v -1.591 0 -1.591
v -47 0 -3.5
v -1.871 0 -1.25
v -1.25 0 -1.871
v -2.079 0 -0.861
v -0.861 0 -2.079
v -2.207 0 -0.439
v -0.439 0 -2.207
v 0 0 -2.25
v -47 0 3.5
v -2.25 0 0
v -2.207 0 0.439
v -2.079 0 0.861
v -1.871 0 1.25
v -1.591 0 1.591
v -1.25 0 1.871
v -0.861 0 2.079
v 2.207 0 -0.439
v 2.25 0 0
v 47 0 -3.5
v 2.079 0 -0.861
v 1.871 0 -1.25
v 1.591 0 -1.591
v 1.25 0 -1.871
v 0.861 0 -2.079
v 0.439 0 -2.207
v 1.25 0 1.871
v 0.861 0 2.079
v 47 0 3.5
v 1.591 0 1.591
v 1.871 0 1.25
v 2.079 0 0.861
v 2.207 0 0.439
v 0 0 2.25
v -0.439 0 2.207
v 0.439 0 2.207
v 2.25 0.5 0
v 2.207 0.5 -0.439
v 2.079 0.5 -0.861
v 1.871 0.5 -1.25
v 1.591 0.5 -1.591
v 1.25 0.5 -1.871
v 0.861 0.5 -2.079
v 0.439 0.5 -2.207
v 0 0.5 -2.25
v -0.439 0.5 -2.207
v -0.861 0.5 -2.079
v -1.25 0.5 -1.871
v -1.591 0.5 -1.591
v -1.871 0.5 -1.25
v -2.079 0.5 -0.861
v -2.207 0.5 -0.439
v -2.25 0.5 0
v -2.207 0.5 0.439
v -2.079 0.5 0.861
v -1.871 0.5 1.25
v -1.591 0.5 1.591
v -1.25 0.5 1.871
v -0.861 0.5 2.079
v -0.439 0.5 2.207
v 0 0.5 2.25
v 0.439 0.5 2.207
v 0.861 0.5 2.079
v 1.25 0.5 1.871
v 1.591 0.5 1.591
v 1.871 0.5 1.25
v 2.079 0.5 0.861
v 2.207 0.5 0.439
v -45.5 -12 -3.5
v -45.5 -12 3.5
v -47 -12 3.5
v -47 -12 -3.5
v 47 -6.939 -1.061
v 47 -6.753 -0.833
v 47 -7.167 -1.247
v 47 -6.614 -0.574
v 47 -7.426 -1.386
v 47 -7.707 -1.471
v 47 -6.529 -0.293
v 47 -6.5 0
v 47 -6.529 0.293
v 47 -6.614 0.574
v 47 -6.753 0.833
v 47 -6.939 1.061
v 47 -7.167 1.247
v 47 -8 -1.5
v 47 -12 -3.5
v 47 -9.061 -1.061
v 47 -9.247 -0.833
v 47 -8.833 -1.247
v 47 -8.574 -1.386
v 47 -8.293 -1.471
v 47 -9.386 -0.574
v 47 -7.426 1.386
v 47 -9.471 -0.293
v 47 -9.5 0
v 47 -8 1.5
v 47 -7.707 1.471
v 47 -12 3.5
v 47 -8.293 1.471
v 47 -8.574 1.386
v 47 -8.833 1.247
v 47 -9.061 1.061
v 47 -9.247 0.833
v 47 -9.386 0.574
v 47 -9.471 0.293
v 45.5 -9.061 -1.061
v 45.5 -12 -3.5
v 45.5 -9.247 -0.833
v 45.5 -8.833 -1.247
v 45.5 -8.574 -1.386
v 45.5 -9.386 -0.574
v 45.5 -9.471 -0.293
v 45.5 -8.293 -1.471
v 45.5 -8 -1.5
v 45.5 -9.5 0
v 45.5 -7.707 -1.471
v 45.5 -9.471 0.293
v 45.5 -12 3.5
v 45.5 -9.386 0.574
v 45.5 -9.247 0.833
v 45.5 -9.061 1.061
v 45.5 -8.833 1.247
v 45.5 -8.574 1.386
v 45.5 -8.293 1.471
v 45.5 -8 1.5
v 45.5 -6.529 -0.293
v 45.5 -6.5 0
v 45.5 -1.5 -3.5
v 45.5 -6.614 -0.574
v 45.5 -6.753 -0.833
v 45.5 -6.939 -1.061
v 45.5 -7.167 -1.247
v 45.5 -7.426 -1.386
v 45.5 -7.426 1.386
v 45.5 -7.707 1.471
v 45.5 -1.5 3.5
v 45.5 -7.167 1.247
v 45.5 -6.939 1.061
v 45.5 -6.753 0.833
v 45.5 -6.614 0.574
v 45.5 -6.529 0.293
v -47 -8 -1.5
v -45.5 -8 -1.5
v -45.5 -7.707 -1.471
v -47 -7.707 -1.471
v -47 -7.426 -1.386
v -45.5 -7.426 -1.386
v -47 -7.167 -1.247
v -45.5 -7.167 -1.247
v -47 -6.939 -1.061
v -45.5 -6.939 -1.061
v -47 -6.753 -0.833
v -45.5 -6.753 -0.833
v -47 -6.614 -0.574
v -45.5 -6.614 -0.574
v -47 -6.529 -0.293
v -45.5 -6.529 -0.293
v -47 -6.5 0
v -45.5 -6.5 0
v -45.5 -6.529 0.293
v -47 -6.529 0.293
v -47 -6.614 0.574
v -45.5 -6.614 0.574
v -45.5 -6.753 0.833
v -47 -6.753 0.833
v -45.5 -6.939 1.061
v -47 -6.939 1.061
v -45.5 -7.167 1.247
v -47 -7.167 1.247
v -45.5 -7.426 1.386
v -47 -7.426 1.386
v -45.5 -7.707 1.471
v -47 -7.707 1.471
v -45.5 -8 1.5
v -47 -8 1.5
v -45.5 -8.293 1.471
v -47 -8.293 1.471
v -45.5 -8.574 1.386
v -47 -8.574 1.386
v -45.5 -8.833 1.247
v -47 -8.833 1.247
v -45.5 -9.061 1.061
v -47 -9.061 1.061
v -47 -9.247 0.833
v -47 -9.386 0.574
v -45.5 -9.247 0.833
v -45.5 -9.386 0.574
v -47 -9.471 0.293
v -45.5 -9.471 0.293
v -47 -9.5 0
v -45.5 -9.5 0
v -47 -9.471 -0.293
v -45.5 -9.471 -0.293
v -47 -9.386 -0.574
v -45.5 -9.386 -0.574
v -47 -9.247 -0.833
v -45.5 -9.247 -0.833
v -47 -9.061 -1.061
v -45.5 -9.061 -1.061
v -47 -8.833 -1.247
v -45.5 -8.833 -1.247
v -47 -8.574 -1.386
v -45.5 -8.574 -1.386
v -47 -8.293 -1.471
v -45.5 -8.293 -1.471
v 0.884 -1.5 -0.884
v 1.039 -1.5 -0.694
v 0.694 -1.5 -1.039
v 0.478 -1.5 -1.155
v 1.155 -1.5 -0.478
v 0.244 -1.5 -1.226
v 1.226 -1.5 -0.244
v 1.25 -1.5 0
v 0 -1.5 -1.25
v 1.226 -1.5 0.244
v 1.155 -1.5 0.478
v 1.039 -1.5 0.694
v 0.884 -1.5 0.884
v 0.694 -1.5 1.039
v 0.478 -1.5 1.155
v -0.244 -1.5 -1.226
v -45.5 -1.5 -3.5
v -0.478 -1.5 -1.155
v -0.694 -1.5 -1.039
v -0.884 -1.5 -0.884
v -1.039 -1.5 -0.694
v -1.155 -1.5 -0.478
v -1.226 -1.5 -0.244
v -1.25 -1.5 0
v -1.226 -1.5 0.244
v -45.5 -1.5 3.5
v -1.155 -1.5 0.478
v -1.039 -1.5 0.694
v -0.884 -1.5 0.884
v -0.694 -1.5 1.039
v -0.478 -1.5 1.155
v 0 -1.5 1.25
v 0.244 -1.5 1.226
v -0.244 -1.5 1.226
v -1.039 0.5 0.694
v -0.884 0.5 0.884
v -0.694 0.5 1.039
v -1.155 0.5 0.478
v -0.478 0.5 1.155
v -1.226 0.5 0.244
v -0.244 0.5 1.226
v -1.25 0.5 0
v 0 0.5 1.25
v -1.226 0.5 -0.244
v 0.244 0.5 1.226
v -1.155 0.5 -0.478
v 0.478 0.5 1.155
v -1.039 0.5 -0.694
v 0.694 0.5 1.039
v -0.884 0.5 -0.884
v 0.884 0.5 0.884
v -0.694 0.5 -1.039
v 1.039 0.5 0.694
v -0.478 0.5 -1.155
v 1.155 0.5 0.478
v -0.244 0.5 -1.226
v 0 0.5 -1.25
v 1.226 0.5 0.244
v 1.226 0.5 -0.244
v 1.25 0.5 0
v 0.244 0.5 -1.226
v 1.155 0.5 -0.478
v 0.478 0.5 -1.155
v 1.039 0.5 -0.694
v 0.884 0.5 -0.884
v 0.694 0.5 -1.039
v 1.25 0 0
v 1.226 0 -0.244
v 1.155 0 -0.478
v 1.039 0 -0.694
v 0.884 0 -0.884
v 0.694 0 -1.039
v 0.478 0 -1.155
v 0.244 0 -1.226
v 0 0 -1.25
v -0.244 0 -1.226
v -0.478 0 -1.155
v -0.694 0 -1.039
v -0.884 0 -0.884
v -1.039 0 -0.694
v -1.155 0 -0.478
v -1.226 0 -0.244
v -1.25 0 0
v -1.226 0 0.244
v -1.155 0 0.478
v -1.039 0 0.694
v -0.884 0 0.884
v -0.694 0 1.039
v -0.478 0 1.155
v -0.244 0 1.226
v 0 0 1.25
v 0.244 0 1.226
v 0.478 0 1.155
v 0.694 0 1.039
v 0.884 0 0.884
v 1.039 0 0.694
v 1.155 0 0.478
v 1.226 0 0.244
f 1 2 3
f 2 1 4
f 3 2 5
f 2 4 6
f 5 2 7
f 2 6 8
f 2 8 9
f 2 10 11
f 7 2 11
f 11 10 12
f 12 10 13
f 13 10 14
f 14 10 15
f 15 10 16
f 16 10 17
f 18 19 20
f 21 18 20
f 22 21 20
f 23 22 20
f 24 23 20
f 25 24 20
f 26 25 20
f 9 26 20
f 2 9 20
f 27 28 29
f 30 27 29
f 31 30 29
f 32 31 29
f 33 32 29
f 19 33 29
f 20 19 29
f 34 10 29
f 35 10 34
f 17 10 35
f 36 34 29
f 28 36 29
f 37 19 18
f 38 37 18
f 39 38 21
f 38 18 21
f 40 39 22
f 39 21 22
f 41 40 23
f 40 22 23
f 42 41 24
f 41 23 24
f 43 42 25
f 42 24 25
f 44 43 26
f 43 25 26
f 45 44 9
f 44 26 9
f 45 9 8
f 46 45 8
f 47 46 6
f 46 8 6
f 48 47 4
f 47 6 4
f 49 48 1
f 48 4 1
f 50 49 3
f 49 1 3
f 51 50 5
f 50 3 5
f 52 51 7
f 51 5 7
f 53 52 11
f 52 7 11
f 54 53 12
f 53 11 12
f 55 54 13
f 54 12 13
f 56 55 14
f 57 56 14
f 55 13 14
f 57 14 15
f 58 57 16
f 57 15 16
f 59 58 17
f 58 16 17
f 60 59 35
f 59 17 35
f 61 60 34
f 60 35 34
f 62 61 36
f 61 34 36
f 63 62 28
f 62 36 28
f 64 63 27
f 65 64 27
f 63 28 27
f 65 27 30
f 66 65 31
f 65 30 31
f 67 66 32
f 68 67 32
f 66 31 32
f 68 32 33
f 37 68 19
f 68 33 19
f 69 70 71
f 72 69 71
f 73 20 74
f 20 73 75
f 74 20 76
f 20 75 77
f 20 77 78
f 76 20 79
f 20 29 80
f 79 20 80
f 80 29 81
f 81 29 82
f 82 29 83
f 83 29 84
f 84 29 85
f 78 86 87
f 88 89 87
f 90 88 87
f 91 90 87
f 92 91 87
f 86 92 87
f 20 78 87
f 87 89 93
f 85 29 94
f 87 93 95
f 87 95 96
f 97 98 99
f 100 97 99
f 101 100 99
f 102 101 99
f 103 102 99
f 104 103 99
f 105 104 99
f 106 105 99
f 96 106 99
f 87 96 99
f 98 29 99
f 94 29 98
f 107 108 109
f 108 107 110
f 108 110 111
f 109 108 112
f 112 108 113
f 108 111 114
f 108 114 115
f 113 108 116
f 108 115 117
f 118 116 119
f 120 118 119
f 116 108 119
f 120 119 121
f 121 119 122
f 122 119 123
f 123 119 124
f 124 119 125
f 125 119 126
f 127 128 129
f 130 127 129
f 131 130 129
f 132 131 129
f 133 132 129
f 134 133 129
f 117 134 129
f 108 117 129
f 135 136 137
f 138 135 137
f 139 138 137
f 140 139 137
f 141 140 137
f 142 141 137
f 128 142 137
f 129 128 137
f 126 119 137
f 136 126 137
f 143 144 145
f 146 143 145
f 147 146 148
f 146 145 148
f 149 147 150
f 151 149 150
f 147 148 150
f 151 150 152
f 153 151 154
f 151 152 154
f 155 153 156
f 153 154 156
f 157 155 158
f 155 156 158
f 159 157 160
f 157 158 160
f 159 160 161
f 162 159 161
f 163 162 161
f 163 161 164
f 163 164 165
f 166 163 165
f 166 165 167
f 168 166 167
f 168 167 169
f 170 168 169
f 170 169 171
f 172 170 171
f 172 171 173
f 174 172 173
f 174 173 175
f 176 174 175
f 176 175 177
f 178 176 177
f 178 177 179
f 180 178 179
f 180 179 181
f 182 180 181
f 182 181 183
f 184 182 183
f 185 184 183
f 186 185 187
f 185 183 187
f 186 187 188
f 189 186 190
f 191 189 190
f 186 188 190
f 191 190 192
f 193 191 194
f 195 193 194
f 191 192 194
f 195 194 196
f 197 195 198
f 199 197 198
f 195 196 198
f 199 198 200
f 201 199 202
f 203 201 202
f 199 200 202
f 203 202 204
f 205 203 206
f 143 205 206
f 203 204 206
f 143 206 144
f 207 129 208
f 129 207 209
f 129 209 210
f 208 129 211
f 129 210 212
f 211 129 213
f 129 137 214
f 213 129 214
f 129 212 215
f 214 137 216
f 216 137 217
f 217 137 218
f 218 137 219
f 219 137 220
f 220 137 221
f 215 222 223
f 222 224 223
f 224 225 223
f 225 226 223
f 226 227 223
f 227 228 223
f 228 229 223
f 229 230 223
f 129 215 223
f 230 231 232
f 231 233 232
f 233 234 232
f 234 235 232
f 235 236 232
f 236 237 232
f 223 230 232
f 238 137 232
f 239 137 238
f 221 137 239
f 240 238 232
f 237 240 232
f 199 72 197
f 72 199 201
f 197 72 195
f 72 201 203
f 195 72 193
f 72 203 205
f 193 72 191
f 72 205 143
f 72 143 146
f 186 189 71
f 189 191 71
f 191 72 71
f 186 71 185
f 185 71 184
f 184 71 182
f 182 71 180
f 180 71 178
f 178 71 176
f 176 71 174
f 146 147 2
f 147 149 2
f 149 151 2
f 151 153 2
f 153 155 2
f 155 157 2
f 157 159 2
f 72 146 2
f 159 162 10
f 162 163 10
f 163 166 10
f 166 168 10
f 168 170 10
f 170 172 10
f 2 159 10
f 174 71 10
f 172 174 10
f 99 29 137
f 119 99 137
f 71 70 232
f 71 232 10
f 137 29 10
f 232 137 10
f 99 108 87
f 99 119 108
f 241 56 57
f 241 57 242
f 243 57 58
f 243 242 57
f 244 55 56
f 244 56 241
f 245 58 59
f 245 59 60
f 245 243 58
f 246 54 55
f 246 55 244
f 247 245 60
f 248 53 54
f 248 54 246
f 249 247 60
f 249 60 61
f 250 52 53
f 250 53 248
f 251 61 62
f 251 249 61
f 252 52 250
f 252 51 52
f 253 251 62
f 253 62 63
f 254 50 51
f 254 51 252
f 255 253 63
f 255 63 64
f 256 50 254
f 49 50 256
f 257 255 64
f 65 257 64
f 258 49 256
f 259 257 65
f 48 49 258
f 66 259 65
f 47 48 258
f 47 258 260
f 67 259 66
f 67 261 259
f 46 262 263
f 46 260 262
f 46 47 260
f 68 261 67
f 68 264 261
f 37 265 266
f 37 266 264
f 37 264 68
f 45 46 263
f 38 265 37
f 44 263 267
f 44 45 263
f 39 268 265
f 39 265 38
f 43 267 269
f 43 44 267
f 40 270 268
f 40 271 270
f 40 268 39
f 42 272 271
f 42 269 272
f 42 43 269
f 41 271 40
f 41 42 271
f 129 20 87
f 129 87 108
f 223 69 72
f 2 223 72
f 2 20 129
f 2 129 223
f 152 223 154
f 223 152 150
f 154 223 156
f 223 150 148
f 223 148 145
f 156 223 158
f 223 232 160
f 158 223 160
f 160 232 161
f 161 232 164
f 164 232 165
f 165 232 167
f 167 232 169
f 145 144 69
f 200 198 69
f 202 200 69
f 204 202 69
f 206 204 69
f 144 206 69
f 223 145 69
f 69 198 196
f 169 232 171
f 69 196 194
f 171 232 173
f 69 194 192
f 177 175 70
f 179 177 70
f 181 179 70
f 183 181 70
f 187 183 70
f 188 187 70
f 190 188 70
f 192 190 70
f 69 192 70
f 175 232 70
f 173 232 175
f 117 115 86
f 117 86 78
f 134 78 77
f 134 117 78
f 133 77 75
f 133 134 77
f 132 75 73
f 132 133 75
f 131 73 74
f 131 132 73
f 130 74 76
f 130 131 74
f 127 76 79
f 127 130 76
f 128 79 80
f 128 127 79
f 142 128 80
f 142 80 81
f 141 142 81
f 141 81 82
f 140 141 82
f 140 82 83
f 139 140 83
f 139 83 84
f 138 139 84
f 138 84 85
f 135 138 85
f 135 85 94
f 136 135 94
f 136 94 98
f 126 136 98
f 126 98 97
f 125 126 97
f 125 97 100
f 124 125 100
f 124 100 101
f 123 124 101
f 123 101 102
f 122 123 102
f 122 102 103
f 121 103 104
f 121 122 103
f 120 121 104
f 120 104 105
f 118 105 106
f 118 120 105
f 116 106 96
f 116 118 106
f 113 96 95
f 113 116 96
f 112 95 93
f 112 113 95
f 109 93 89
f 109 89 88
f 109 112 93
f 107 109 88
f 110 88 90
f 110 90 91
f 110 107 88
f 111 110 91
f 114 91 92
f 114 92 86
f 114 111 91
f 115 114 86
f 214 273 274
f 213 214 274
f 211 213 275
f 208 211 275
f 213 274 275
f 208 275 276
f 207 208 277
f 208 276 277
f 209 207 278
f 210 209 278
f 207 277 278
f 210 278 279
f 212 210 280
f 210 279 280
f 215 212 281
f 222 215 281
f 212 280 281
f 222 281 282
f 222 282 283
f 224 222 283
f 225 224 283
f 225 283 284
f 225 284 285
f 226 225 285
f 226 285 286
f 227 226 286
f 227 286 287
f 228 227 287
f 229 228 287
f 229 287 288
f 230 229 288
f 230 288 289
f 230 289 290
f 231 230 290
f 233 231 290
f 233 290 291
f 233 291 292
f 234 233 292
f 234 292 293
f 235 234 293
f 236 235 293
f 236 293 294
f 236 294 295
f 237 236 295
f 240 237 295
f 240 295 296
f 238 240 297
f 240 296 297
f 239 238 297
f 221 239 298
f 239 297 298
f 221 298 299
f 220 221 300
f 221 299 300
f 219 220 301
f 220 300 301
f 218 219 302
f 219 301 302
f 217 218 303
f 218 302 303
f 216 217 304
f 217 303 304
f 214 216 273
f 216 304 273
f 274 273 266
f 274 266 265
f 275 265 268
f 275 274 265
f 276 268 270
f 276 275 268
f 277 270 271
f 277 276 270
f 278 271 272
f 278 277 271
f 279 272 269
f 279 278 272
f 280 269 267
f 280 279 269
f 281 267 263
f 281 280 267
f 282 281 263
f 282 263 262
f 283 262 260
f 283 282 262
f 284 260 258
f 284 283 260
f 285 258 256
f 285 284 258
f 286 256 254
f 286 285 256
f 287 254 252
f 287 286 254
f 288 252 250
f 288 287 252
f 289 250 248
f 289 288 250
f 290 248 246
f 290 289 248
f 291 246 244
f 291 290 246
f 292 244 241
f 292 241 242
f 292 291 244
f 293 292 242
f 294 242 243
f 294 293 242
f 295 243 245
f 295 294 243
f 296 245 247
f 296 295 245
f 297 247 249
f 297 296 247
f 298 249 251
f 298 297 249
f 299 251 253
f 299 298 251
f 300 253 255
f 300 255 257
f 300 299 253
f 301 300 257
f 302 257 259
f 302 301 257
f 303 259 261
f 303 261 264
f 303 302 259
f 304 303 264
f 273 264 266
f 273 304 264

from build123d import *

# Parameters (mm, degrees)
BOSS_EXTRUDE3_DEPTH      = 3.5
BOSS_EXTRUDE3_DEPTH_BACK = 3.5
SKETCH4_R                = 1.25
CUT_EXTRUDE1_DEPTH       = 3.5
SKETCH5_R                = 2.25
SKETCH5_R_2              = 1.25
BOSS_EXTRUDE5_DEPTH      = 0.5
SKETCH8_R                = 1.5
CUT_EXTRUDE3_DEPTH       = 47
SKETCH10_R               = 1.5
CUT_EXTRUDE4_DEPTH       = 47


with BuildPart() as part:
    # Sketch1 → Boss-Extrude3 (new body, two sides)
    with BuildSketch(Plane.XY) as boss_extrude3_sk:
        Polygon((-47, 0), (47, 0), (47, -12), (46.584070796, -12), (45.5, -12), (45.5, -1.5), (-45.5, -1.5), (-45.5, -12), (-47, -12), align=None)
    extrude(amount=BOSS_EXTRUDE3_DEPTH)
    extrude(boss_extrude3_sk.sketch, amount=-BOSS_EXTRUDE3_DEPTH_BACK)

    # Sketch4 → Cut-Extrude1 (cut)
    with BuildSketch(Plane(origin=(0, 0, 0), x_dir=(1, 0, 0), z_dir=(0, 1, 0))):
        Circle(SKETCH4_R)
    extrude(amount=-CUT_EXTRUDE1_DEPTH, mode=Mode.SUBTRACT)

    # Sketch5 → Boss-Extrude5 (add)
    with BuildSketch(Plane(origin=(0, 0, 0), x_dir=(1, 0, 0), z_dir=(0, 1, 0))):
        Circle(SKETCH5_R)
        Circle(SKETCH5_R_2, mode=Mode.SUBTRACT)
    extrude(amount=BOSS_EXTRUDE5_DEPTH)

    # Sketch8 → Cut-Extrude3 (cut)
    with BuildSketch(Plane(origin=(0, 0, 0), x_dir=(0, 0, -1), z_dir=(1, 0, 0))):
        with Locations((0, -8)):
            Circle(SKETCH8_R)
    extrude(amount=CUT_EXTRUDE3_DEPTH, mode=Mode.SUBTRACT)

    # Sketch10 → Cut-Extrude4 (cut)
    with BuildSketch(Plane(origin=(0, 0, 0), x_dir=(0, 0, -1), z_dir=(1, 0, 0))):
        with Locations((0, -8)):
            Circle(SKETCH10_R)
    extrude(amount=-CUT_EXTRUDE4_DEPTH, mode=Mode.SUBTRACT)


solid = part.part
